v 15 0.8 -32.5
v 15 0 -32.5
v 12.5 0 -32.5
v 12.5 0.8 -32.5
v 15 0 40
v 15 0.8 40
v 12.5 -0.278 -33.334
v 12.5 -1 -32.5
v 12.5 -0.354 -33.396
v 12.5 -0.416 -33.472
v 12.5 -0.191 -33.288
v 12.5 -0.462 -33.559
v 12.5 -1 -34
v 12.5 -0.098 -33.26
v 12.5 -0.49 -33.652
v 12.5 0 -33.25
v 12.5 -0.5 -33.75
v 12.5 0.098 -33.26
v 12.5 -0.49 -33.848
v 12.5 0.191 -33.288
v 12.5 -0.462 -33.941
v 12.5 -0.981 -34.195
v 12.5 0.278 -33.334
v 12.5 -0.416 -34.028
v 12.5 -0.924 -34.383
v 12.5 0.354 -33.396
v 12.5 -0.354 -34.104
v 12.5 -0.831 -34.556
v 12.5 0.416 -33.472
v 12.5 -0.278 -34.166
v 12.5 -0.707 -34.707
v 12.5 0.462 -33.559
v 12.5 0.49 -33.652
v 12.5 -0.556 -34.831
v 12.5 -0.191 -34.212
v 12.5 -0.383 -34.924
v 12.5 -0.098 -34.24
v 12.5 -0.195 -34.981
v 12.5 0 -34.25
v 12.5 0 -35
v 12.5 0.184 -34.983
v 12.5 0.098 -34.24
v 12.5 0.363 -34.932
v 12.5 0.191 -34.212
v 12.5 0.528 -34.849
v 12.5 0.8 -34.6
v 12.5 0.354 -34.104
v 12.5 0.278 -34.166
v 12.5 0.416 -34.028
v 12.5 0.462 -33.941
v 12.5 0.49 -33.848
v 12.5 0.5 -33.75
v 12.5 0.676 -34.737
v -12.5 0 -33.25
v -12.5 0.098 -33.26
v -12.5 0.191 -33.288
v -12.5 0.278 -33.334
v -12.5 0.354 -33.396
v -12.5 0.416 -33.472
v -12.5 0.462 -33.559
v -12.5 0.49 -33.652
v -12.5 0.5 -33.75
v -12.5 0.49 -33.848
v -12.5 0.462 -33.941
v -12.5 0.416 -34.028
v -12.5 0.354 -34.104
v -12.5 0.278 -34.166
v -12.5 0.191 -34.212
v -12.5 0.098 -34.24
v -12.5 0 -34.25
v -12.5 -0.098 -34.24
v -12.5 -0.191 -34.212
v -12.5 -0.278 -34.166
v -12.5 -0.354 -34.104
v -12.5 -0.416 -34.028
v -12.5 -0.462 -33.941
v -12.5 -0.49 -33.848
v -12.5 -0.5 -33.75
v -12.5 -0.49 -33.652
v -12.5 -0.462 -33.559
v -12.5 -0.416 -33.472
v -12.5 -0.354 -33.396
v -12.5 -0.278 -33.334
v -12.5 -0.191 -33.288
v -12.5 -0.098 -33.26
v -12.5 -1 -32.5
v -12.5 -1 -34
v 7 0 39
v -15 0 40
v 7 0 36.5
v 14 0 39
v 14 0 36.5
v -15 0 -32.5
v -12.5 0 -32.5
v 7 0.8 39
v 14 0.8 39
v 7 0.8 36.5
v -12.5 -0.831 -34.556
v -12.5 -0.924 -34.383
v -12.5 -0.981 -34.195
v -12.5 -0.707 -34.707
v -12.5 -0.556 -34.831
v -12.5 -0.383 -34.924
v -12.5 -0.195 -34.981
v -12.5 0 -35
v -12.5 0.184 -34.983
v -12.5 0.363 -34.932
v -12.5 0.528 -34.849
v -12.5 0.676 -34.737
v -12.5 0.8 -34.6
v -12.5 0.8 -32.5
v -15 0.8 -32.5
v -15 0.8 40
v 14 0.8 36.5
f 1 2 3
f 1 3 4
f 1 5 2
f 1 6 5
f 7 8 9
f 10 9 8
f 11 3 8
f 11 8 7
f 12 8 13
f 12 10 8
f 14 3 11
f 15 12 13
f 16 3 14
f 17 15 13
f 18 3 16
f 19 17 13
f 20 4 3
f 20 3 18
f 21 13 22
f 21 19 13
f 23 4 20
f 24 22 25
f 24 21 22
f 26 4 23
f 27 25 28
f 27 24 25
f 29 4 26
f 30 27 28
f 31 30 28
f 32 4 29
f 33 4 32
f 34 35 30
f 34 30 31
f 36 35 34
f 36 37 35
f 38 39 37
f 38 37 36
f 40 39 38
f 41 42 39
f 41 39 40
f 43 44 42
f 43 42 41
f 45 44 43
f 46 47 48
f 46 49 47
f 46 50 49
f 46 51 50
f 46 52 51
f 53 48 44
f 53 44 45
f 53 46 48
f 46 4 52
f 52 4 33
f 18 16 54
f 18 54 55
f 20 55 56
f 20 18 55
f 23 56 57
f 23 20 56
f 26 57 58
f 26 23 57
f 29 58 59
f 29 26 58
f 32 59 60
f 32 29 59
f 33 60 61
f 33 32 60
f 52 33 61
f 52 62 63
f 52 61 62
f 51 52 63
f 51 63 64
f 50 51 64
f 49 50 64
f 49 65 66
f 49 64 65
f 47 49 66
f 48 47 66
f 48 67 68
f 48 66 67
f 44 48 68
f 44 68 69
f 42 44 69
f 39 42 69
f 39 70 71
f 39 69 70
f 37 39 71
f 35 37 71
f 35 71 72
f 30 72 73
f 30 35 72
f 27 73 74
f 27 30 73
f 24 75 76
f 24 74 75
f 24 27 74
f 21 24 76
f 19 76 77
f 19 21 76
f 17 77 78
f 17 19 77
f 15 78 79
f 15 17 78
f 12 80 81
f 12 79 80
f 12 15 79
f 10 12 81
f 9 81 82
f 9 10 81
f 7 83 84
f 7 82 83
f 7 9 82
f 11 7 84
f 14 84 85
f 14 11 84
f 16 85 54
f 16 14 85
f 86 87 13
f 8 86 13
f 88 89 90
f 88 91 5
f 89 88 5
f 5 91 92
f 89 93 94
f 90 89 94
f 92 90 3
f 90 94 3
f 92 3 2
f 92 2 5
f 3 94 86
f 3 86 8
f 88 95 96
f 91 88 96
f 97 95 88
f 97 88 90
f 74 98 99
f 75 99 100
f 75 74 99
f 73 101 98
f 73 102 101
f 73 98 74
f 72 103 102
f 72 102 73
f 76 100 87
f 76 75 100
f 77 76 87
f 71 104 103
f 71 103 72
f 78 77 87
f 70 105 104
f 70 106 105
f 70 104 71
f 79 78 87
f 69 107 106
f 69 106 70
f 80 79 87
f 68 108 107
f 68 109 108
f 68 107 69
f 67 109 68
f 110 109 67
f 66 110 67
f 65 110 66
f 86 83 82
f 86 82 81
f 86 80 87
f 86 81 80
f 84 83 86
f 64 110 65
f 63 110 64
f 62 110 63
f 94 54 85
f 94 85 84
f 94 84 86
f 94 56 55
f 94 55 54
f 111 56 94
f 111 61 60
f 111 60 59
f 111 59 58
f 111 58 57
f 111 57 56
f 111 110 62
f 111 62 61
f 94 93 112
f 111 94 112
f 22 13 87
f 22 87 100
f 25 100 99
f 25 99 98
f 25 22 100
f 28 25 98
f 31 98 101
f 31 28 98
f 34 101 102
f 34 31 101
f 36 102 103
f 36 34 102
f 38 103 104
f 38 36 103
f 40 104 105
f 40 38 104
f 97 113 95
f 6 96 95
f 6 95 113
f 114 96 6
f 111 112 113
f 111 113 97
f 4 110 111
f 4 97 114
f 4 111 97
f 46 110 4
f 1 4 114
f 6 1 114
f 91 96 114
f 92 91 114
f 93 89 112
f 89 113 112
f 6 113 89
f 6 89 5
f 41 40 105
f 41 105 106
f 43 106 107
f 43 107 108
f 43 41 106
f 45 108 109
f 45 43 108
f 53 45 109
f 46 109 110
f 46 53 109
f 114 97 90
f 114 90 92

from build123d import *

# Parameters (mm, degrees)
SKETCH1_W           = 30
SKETCH1_H           = 70
BOSS_EXTRUDE1_DEPTH = 1
SKETCH5_W           = 30
SKETCH5_H           = 1
BOSS_EXTRUDE3_DEPTH = 5
SKETCH6_W           = 7
SKETCH6_H           = 2.5
CUT_EXTRUDE3_DEPTH  = 1
SKETCH2_W           = 30
SKETCH2_H           = 2.5
BOSS_EXTRUDE4_DEPTH = 1
CUT_EXTRUDE4_START  = -30
SKETCH7_R           = 0.5
CUT_EXTRUDE4_DEPTH  = 30
FILLET1_R           = 1
SKETCH9_W           = 3
SKETCH9_H           = 2
CUT_EXTRUDE5_DEPTH  = 2.5
SKETCH10_W          = 3
SKETCH10_H          = 2
CUT_EXTRUDE6_DEPTH  = 2.5
SKETCH11_W          = 33.967551934
SKETCH11_H          = 76.426629991
CUT_EXTRUDE7_DEPTH  = 0.2


with BuildPart() as part:
    # Sketch1 → Boss-Extrude1 (new body)
    with BuildSketch(Plane(origin=(0, 0, 0), x_dir=(1, 0, 0), z_dir=(0, 1, 0))):
        Rectangle(SKETCH1_W, SKETCH1_H)
    extrude(amount=BOSS_EXTRUDE1_DEPTH)

    # Sketch5 → Boss-Extrude3 (add)
    with BuildSketch(Plane.XY.offset(35)):
        with Locations((0, 0.5)):
            Rectangle(SKETCH5_W, SKETCH5_H)
    extrude(amount=BOSS_EXTRUDE3_DEPTH)

    # Sketch6 → Cut-Extrude3 (cut)
    with BuildSketch(Plane(origin=(0, 1, 0), x_dir=(1, 0, 0), z_dir=(0, 1, 0))):
        with Locations((10.5, -37.75)):
            Rectangle(SKETCH6_W, SKETCH6_H)
    extrude(amount=-CUT_EXTRUDE3_DEPTH, mode=Mode.SUBTRACT)

    # Sketch2 → Boss-Extrude4 (add)
    with BuildSketch(Plane(origin=(0, 0, 0), x_dir=(1, 0, 0), z_dir=(0, 1, 0))):
        with Locations((0, 33.75)):
            Rectangle(SKETCH2_W, SKETCH2_H)
    extrude(amount=-BOSS_EXTRUDE4_DEPTH)

    # Sketch7 → Cut-Extrude4 (cut)
    with BuildSketch(Plane.ZY.offset(15).offset(CUT_EXTRUDE4_START)):
        with Locations((-33.75, 0)):
            Circle(SKETCH7_R)
    extrude(amount=CUT_EXTRUDE4_DEPTH, mode=Mode.SUBTRACT)

    # Fillet1
    fillet1_edges = [part.edges().sort_by_distance(p)[0] for p in [
        (0, -1, -35),
        (0, 1, -35),
    ]]
    fillet(fillet1_edges, radius=FILLET1_R - 0.0001)  # a hair under: the kernel refuses the full size

    # Sketch9 → Cut-Extrude5 (cut)
    with BuildSketch(Plane.ZY.offset(15)):
        with Locations((-34, 0)):
            Rectangle(SKETCH9_W, SKETCH9_H)
    extrude(amount=-CUT_EXTRUDE5_DEPTH, mode=Mode.SUBTRACT)

    # Sketch10 → Cut-Extrude6 (cut)
    with BuildSketch(Plane(origin=(15, 0, 0), x_dir=(0, 0, -1), z_dir=(1, 0, 0))):
        with Locations((34, 0)):
            Rectangle(SKETCH10_W, SKETCH10_H)
    extrude(amount=-CUT_EXTRUDE6_DEPTH, mode=Mode.SUBTRACT)

    # Sketch11 → Cut-Extrude7 (cut)
    with BuildSketch(Plane(origin=(0, 1, 0), x_dir=(1, 0, 0), z_dir=(0, 1, 0))):
        with Locations((-1.983775967, -1.786685004)):
            Rectangle(SKETCH11_W, SKETCH11_H)
    extrude(amount=-CUT_EXTRUDE7_DEPTH, mode=Mode.SUBTRACT)


solid = part.part
